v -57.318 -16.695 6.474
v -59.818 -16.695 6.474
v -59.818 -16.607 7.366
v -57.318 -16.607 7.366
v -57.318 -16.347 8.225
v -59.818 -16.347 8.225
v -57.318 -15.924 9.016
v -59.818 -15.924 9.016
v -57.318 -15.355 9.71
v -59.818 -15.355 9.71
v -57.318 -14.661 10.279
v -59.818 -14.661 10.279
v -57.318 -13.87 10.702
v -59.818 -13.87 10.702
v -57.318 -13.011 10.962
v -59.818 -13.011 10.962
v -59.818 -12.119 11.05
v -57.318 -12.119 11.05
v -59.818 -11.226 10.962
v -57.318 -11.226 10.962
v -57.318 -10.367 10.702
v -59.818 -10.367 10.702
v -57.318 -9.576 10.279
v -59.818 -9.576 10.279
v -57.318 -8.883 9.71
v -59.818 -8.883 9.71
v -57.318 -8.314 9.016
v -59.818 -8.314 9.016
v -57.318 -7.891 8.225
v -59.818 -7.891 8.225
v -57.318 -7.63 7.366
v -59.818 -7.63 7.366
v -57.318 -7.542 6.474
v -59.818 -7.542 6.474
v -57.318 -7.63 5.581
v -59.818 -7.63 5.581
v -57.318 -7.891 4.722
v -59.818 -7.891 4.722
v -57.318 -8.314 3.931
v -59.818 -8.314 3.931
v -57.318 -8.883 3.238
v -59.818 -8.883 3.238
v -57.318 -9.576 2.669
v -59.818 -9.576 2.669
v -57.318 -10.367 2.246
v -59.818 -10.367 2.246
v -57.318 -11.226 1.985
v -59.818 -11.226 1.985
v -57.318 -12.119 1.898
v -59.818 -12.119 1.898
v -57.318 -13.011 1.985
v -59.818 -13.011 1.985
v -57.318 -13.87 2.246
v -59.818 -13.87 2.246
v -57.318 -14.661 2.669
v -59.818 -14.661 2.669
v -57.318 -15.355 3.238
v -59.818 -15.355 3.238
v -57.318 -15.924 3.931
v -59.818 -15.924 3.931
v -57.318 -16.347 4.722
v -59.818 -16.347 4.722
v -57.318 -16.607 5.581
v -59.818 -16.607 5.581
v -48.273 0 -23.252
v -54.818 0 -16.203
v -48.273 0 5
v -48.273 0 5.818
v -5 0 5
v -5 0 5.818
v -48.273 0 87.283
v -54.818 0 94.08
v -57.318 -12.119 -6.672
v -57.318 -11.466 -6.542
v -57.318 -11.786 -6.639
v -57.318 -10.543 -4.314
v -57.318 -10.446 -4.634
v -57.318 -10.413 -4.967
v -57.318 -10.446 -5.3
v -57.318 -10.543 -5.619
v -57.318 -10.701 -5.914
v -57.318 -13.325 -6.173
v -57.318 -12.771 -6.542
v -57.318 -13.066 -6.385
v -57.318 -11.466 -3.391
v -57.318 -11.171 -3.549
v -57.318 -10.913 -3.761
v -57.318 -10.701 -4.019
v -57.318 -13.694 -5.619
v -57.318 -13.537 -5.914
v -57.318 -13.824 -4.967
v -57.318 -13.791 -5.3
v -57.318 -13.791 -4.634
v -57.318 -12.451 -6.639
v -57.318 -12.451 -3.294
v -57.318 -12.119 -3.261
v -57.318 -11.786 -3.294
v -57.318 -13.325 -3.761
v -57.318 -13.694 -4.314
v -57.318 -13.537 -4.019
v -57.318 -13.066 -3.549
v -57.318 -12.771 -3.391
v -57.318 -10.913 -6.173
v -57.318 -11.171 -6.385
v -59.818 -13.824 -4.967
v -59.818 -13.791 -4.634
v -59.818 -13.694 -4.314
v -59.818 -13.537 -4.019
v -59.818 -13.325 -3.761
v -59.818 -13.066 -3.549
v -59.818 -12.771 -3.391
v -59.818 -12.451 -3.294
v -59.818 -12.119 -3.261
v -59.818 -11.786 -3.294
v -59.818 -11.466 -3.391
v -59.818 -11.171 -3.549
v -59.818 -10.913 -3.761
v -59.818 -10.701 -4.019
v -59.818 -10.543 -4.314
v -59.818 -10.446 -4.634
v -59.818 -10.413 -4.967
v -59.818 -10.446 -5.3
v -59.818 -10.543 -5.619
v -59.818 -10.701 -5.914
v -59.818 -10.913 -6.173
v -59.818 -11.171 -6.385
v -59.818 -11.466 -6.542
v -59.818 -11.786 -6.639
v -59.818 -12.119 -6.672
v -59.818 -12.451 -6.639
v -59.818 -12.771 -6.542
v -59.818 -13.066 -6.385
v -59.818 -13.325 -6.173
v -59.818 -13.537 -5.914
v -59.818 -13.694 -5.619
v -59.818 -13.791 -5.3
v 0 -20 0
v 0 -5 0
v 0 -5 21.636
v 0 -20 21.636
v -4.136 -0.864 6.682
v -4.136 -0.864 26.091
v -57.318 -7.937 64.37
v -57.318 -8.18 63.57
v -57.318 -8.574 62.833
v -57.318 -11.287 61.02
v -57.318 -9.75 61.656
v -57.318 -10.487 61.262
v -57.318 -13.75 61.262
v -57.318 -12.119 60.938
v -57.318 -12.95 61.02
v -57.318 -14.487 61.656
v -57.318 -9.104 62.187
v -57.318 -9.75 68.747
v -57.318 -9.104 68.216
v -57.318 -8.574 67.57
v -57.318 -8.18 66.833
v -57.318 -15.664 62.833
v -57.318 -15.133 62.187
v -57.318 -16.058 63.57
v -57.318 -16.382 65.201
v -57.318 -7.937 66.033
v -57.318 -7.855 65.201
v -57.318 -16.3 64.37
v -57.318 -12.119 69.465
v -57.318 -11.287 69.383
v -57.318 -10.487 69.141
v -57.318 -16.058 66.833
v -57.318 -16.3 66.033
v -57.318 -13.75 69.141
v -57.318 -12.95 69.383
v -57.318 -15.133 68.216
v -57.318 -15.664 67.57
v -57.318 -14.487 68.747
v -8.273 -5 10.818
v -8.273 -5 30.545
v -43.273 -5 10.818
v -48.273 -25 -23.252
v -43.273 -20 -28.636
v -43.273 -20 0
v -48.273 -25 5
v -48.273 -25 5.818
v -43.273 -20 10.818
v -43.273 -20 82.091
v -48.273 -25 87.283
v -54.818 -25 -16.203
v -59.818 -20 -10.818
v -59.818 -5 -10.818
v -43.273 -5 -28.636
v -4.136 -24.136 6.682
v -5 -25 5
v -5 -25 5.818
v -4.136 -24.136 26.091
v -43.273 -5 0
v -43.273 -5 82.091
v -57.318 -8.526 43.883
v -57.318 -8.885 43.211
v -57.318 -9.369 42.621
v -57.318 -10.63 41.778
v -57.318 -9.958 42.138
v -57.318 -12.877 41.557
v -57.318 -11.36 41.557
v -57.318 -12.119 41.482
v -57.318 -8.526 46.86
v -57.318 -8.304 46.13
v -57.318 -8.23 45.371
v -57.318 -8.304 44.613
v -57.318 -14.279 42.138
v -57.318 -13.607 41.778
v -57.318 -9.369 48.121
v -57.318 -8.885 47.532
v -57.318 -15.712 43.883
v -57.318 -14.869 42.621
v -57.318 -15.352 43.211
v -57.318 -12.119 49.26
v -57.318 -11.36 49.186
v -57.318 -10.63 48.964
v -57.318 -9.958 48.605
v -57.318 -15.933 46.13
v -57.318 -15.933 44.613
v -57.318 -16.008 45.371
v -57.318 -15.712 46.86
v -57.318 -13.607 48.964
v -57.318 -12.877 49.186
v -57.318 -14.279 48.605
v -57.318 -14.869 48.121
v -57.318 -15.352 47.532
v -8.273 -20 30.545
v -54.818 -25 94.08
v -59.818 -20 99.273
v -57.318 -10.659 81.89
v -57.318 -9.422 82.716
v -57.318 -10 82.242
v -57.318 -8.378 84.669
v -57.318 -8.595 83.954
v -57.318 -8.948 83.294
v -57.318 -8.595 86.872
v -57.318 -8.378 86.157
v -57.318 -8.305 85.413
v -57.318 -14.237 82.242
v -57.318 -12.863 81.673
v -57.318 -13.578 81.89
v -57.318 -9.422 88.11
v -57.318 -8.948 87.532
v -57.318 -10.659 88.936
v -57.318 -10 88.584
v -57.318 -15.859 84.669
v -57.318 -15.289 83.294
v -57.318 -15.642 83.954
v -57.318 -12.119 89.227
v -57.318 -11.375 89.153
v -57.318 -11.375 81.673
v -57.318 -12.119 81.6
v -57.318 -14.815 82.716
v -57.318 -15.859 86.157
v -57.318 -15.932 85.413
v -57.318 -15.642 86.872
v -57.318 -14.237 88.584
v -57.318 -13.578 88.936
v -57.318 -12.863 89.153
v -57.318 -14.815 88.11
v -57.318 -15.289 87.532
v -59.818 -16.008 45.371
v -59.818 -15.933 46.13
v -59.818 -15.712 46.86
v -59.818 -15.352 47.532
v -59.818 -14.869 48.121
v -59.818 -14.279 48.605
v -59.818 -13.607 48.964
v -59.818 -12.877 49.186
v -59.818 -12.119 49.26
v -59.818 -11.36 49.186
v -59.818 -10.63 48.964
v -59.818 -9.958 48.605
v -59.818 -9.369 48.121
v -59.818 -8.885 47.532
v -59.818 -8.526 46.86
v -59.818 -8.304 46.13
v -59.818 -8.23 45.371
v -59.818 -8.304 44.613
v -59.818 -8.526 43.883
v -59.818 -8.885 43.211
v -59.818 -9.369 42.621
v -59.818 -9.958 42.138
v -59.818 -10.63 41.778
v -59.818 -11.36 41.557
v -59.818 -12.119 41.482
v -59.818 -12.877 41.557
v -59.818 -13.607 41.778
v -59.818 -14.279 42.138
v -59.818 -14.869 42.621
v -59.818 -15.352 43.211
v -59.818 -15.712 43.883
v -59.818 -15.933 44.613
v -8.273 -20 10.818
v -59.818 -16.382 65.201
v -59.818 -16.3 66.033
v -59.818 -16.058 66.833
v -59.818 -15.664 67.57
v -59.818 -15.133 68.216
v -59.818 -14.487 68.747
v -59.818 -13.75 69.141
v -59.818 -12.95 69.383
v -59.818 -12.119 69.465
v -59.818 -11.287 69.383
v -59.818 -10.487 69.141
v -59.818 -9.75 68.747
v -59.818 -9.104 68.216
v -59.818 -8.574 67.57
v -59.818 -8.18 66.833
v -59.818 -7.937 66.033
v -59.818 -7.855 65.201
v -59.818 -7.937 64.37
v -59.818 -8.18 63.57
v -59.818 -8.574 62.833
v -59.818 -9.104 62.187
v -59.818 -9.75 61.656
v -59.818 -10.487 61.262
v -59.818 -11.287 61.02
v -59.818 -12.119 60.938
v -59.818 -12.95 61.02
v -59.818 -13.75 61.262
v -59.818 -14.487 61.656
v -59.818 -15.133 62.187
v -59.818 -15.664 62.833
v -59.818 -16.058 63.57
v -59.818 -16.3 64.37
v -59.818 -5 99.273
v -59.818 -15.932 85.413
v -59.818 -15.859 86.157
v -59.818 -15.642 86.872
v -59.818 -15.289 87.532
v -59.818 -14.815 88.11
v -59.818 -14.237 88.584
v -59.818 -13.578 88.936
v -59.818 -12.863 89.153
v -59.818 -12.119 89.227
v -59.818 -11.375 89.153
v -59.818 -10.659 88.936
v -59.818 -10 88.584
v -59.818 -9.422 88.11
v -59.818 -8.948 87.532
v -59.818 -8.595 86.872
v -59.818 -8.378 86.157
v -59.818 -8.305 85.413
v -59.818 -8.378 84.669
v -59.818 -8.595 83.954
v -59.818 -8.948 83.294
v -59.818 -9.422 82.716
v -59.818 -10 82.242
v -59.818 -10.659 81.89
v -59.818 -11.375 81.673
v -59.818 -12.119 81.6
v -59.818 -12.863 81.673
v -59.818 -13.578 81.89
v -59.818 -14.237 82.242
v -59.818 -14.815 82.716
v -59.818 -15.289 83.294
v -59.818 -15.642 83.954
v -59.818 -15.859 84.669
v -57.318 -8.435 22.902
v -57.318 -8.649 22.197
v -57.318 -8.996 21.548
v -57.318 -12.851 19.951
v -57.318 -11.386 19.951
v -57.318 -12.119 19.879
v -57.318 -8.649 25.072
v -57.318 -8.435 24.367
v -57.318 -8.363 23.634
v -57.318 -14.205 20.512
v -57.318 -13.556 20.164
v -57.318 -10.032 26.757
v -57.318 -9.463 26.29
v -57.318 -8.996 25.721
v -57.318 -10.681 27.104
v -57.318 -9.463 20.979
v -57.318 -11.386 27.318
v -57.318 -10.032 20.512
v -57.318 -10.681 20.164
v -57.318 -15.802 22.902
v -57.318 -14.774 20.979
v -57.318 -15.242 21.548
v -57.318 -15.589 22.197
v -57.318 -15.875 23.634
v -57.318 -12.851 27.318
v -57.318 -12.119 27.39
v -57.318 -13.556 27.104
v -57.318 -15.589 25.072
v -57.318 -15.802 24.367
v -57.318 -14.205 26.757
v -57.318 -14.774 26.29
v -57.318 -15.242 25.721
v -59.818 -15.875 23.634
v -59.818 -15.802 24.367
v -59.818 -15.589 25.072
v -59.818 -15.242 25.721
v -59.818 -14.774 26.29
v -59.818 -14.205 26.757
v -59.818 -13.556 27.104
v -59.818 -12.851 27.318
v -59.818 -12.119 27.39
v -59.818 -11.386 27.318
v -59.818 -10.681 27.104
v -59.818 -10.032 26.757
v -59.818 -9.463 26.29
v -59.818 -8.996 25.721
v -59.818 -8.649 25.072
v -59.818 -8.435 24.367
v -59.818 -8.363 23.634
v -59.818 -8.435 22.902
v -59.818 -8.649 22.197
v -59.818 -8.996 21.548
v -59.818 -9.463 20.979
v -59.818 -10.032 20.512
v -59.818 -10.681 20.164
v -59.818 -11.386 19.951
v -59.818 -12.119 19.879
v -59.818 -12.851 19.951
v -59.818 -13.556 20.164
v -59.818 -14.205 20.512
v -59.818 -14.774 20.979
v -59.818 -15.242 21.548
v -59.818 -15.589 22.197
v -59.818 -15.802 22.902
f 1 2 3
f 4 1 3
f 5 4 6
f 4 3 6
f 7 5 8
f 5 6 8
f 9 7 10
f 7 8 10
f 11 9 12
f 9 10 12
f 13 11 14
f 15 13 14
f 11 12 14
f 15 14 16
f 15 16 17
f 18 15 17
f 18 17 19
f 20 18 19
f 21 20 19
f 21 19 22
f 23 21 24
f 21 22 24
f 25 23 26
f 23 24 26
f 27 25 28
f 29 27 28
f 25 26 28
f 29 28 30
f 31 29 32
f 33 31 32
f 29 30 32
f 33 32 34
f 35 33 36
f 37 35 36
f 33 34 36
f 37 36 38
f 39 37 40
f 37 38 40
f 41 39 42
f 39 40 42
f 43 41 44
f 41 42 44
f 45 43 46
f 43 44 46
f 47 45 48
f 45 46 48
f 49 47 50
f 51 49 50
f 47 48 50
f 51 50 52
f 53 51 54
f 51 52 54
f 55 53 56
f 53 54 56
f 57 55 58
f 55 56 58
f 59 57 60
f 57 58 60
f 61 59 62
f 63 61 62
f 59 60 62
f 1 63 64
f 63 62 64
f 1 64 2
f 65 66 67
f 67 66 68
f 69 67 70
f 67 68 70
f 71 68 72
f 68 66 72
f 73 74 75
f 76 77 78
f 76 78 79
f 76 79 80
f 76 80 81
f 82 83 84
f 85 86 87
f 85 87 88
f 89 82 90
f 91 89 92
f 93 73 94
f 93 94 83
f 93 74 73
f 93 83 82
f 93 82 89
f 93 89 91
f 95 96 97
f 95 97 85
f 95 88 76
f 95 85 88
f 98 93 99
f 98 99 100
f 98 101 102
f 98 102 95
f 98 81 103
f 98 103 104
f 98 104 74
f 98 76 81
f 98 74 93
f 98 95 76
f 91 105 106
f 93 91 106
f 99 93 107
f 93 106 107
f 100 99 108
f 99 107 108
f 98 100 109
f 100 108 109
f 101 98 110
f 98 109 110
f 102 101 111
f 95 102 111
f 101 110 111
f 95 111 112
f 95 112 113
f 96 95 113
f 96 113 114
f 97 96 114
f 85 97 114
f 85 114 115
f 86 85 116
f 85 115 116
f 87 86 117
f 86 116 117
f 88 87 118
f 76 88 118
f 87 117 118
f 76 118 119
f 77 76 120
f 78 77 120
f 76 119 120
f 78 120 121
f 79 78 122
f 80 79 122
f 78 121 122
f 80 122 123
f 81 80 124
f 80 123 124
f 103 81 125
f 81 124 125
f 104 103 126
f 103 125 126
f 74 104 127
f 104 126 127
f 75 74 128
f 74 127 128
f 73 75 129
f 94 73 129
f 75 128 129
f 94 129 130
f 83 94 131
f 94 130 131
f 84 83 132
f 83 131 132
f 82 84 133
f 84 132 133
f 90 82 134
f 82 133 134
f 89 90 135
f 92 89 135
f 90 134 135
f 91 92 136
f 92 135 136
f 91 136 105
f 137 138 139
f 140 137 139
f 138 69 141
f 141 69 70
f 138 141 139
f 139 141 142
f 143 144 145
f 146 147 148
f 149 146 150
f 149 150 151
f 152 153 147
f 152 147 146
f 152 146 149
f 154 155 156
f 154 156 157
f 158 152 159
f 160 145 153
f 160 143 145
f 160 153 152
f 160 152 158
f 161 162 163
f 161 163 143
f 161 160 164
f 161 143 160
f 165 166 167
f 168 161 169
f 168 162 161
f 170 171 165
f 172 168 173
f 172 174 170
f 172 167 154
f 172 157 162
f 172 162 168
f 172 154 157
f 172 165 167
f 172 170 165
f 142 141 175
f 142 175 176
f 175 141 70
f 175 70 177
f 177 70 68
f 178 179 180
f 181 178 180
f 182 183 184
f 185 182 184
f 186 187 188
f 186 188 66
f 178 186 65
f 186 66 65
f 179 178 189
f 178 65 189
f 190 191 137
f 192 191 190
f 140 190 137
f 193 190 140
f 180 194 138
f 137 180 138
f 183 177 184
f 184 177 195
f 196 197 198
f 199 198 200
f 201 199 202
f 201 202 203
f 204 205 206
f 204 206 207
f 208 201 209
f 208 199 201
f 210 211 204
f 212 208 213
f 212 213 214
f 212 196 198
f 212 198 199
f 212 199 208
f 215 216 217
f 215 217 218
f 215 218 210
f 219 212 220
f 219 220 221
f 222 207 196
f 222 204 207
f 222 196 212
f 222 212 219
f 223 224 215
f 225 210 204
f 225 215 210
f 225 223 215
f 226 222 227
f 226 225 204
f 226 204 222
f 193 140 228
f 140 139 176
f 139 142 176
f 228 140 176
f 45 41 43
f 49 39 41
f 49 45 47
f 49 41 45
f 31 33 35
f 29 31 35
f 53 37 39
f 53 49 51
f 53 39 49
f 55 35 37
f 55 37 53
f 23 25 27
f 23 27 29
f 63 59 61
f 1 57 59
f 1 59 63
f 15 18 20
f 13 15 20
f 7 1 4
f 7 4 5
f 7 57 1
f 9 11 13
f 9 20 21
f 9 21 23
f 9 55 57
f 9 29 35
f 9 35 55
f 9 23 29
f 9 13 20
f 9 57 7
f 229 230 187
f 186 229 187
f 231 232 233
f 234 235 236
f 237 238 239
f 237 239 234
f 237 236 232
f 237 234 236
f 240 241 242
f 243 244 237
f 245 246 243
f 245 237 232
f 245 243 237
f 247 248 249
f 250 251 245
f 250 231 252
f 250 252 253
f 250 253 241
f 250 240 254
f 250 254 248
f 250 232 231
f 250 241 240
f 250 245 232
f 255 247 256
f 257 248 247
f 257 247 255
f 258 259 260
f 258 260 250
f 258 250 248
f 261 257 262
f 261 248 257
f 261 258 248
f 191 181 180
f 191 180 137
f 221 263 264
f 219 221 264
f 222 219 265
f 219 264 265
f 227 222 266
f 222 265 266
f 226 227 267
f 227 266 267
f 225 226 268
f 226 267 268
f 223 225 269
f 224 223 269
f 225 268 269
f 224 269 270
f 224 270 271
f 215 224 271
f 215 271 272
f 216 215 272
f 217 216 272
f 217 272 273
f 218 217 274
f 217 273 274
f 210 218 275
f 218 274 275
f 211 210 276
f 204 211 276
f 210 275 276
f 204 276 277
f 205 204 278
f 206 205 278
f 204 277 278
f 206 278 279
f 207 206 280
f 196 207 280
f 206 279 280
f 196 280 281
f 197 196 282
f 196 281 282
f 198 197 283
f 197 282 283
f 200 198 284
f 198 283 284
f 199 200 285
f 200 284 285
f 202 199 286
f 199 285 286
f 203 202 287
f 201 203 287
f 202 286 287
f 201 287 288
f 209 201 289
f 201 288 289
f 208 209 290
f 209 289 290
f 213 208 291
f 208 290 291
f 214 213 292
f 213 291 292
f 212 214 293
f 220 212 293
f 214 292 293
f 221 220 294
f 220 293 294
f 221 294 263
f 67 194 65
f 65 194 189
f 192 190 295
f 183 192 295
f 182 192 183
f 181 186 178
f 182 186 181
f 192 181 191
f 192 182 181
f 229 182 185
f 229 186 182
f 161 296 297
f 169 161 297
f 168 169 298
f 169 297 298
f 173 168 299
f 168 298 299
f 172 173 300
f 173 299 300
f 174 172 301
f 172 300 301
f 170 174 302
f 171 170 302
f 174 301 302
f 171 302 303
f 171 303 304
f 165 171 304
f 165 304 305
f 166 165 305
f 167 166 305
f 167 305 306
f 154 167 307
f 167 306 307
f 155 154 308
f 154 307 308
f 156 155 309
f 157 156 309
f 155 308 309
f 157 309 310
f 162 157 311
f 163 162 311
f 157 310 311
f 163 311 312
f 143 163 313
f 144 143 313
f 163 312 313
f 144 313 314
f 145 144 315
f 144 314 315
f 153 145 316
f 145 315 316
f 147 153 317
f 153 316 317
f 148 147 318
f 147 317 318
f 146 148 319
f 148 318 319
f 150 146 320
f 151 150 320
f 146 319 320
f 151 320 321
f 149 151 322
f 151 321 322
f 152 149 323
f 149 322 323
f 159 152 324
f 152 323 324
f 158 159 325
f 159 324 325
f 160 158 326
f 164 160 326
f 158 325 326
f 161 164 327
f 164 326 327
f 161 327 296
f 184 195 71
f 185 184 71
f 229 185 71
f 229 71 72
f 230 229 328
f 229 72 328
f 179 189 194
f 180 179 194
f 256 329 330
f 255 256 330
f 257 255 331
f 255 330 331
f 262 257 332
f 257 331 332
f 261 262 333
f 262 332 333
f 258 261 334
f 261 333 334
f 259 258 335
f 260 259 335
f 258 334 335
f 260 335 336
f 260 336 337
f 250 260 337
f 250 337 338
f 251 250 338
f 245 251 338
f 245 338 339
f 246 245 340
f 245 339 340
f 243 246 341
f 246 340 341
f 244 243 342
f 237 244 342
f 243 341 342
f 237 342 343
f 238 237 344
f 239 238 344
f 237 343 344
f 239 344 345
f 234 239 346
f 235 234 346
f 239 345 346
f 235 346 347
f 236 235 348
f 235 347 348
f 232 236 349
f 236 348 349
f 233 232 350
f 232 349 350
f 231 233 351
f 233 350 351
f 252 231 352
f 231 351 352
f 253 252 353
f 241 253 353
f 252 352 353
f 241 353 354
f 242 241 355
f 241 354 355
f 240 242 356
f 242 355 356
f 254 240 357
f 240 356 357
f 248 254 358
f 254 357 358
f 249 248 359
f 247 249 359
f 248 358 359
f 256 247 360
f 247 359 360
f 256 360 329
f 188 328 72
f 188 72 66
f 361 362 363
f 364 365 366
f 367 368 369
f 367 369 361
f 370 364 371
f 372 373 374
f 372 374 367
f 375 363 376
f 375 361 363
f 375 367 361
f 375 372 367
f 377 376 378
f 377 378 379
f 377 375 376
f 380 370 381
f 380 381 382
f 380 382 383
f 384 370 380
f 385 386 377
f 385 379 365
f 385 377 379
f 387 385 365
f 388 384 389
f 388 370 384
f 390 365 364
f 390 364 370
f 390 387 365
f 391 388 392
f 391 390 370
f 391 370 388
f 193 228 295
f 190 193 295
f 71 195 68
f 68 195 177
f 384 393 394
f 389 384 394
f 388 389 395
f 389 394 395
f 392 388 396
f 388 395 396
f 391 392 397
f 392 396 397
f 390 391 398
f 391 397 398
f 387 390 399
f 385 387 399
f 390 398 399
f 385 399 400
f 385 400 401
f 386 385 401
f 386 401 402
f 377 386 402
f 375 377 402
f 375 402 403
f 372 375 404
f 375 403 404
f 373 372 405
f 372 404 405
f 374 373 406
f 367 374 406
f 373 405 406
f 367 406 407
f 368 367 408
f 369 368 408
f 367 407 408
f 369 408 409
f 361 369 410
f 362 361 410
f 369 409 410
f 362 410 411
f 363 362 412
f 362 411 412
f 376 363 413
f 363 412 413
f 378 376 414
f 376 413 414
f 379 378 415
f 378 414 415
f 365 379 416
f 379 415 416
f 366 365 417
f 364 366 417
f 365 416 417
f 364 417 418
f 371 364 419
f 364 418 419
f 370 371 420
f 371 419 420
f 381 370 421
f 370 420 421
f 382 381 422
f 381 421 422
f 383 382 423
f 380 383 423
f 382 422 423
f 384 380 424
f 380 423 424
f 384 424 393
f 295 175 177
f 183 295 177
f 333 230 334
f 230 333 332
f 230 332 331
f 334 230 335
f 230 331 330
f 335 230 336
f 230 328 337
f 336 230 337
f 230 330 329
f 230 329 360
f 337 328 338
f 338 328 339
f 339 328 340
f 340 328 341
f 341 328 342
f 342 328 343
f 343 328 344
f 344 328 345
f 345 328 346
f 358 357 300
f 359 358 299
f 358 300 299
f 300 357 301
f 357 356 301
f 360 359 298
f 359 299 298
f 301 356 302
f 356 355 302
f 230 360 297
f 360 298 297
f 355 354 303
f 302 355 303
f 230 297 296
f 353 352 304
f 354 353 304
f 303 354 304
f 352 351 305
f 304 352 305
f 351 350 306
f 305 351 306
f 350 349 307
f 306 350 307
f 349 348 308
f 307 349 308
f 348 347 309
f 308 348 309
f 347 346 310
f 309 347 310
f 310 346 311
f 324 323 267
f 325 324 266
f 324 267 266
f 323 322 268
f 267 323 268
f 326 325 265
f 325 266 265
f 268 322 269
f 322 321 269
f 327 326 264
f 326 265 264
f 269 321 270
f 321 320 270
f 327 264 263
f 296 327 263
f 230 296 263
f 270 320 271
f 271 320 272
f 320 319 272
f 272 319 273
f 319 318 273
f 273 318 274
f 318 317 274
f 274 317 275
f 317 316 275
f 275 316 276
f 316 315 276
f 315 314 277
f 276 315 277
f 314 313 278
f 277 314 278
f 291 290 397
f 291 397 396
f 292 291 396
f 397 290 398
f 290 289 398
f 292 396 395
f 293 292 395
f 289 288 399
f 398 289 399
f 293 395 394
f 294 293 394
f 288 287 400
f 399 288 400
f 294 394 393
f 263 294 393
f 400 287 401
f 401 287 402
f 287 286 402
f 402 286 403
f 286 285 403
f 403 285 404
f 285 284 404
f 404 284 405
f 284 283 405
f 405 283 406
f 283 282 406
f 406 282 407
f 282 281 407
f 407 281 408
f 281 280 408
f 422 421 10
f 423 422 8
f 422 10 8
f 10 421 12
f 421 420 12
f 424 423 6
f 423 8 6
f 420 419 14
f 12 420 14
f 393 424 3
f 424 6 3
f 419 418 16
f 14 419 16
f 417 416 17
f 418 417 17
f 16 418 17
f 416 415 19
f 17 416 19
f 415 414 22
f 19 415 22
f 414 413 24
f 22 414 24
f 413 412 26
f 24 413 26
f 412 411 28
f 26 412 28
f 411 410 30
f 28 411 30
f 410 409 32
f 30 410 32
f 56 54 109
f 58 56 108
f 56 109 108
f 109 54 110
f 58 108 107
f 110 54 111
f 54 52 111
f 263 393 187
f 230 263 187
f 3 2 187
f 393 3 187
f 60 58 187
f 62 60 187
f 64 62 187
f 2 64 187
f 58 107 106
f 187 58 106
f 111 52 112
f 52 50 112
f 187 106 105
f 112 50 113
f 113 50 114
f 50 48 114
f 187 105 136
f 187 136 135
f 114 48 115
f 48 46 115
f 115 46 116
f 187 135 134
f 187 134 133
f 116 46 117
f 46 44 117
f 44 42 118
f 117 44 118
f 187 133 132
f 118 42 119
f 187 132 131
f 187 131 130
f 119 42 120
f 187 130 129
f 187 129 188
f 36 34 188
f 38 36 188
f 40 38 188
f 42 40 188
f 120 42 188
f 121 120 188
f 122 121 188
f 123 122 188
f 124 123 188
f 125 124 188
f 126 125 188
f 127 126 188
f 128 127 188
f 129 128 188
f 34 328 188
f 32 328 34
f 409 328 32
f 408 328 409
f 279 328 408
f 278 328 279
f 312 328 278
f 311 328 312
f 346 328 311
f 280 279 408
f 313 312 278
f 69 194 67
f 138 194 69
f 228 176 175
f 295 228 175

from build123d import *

# Parameters (mm, degrees)
F1_DEPTH   = 25
F2_SIZE    = 5
F3_SIZE    = 5
F4_C1_SIZE = 5
F4_C2_SIZE = 5
F4_C3_SIZE = 5
F4_C4_SIZE = 5
F5_SIZE    = 5
F6_R       = 3.8134977221
F6_R_2     = 4.2636207358
F6_R_3     = 3.889016134
F6_R_4     = 3.7558552916
F6_R_5     = 4.5761931688
F6_R_6     = 1.7054444875
F7_DEPTH   = 2.5


with BuildPart() as f1:
    # F0 (on Front) → F1 (new body)
    with BuildSketch(Plane.XZ):
        Polygon((0, 0), (0, 21.6363706006), (-8.27272566, 30.5454584579), (-8.27272566, 10.8181868544), (-43.27272566, 10.8181868544), (-43.27272566, 0), align=None)
        Polygon((-43.27272566, -28.6363649917), (-43.27272566, 0), (-43.27272566, 10.8181868544), (-43.27272566, 82.0909227153), (-59.8181864452, 99.2727460619), (-59.8181864452, -10.8181790838), align=None)
    extrude(amount=F1_DEPTH)

    # F2
    f2_edges = [f1.edges().sort_by_distance(p)[0] for p in [
        (-25.772726, -25, 10.818187),
        (-21.636363, -25, 0),
    ]]
    chamfer(f2_edges, length=F2_SIZE)

    # F3
    f3_edges = [f1.edges().sort_by_distance(p)[0] for p in [
        (-25.772726, 0, 10.818187),
        (-21.636363, 0, 0),
    ]]
    chamfer(f3_edges, length=F3_SIZE)

    # F4: chamfer of 5 on 4 edges, made by hand

    # F4_c1
    f4_c1_edges = [f1.edges().sort_by_distance(p)[0] for p in [
        (-8.27272566, 0, 20.6818226561),
        (-8.27272566, 0, 8.3181868544),
    ]]
    chamfer(f4_c1_edges, length=F4_C1_SIZE)

    # F4_c2
    f4_c2_edges = [f1.edges().sort_by_distance(p)[0] for p in [
        (-8.27272566, -25, 20.6818226561),
        (-8.27272566, -25, 8.3181868544),
    ]]
    chamfer(f4_c2_edges, length=F4_C2_SIZE)

    # F4_c3
    f4_c3_edges = [f1.edges().sort_by_distance(p)[0] for p in [
        (0, 0, 13.3181853003),
    ]]
    chamfer(f4_c3_edges, length=F4_C3_SIZE)

    # F4_c4
    f4_c4_edges = [f1.edges().sort_by_distance(p)[0] for p in [
        (0, -25, 13.3181853003),
    ]]
    chamfer(f4_c4_edges, length=F4_C4_SIZE)

    # F5
    f5_edges = [f1.edges().sort_by_distance(p)[0] for p in [
        (-43.272726, 0, 46.454555),
        (-43.272726, 0, -14.318182),
        (-59.818186, 0, 44.227283),
        (-43.272726, -25, 46.454555),
        (-43.272726, -25, -14.318182),
        (-59.818186, -25, 44.227283),
    ]]
    chamfer(f5_edges, length=F5_SIZE)

    # F6 (on face) → F7 (cut)
    with BuildSketch(Plane(origin=(-59.8181864452, 0, 0), x_dir=(0, -1, 0), z_dir=(-1, 0, 0))):
        with Locations((12.1186533943, 85.4130089283)):
            Circle(F6_R)
        with Locations((12.1186533943, 65.2014911175)):
            Circle(F6_R_2)
        with Locations((12.1186533943, 45.3713275492)):
            Circle(F6_R_3)
        with Locations((12.1186533943, 23.6344132572)):
            Circle(F6_R_4)
        with Locations((12.1186533943, 6.4736939967)):
            Circle(F6_R_5)
        with Locations((12.1186533943, -4.9667861313)):
            Circle(F6_R_6)
    extrude(amount=-F7_DEPTH, mode=Mode.SUBTRACT)


solid = f1.part
